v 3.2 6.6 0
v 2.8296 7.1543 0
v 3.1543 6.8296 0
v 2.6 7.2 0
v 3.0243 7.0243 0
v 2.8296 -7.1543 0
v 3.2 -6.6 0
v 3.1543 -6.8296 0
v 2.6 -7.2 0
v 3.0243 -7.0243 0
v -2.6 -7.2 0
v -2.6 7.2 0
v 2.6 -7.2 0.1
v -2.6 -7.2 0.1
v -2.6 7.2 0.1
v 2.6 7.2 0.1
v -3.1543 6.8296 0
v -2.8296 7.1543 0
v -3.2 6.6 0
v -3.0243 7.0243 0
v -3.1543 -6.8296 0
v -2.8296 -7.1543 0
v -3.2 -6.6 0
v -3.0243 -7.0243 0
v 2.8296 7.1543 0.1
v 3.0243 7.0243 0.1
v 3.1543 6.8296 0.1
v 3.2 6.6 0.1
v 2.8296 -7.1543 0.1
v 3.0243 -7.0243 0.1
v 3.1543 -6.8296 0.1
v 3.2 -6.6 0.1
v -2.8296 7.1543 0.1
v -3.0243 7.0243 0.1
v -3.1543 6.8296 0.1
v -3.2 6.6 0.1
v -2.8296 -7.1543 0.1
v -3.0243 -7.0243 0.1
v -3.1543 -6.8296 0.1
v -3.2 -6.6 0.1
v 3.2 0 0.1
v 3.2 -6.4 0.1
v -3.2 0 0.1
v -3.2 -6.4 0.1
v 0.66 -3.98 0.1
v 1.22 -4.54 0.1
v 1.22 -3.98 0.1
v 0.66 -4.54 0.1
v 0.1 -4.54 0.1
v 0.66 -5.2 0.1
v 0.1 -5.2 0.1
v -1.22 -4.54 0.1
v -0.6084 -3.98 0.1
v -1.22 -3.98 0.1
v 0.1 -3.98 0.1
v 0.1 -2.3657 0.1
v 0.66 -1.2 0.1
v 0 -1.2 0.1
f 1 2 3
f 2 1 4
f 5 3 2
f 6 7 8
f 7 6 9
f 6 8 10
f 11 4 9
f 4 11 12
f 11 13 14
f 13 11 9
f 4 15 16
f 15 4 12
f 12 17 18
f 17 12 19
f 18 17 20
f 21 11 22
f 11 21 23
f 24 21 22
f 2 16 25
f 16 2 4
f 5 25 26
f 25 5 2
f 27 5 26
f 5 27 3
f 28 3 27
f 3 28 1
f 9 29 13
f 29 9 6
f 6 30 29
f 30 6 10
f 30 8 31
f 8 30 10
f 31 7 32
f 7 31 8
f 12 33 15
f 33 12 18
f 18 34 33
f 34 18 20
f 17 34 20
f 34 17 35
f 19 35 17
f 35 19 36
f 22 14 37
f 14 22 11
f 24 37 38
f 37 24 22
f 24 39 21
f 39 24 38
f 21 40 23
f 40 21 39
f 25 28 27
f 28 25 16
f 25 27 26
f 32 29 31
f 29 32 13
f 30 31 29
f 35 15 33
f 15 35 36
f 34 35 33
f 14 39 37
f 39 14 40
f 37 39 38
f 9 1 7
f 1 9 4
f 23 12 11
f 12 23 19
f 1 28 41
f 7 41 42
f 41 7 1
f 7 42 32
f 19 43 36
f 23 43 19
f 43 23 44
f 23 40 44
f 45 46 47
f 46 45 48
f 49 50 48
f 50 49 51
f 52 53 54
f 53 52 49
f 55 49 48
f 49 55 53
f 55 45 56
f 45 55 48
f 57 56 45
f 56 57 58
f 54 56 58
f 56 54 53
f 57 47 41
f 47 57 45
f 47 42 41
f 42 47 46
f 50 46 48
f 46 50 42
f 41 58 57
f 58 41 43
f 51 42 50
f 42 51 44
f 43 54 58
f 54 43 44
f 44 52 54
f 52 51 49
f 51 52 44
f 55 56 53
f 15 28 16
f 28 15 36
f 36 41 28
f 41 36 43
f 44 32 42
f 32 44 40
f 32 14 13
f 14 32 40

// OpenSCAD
// file: ../p/box3u12.scad
use <../lib.scad>
function ldraw_lib__box3u12() = [
// 0 Box with 3 Parallel Faces without Any Edges
// 0 Name: box3u12.dat
// 0 Author: J.C. Tchang [tchang]
// 0 !LDRAW_ORG Primitive UPDATE 2014-02
// 0 !LICENSE Licensed under CC BY 4.0 : see CAreadme.txt
// 
// 0 BFC CERTIFY CCW
  [0,"BFC","CERTIFY"],
  [0,"BFC","CCW"],
// 
// 0 !HISTORY 2014-12-23 [PTadmin] Official Update 2014-02
// 
// 
// 4 16 -1 1 1 1 1 1 1 1 -1 -1 1 -1
  [4,16,-1,1,1,1,1,1,1,1,-1,-1,1,-1],
// 4 16 -1 1 1 -1 0 1 1 0 1 1 1 1
  [4,16,-1,1,1,-1,0,1,1,0,1,1,1,1],
// 4 16 1 1 -1 1 0 -1 -1 0 -1 -1 1 -1
  [4,16,1,1,-1,1,0,-1,-1,0,-1,-1,1,-1],
];
module ldraw_lib__box3u12(step=0, col=false, unit=2/5, alt=false, line=0.2, solid=!$preview)
    makepoly(ldraw_lib__box3u12(), step=step, col=col, unit=unit, alt=alt, line=line, solid=solid);
ldraw_lib__box3u12(line=0.2);
// file: ../p/1-4cyli.scad
use <../lib.scad>
function ldraw_lib__1_4cyli() = [
// 0 Cylinder 0.25
// 0 Name: 1-4cyli.dat
// 0 Author: James Jessiman
// 0 !LDRAW_ORG Primitive UPDATE 2012-01
// 0 !LICENSE Licensed under CC BY 4.0 : see CAreadme.txt
// 
// 0 BFC CERTIFY CCW
  [0,"BFC","CERTIFY"],
  [0,"BFC","CCW"],
// 
// 0 !HISTORY 2002-03-23 [sbliss] Added BFC statement.
// 0 !HISTORY 2002-04-25 [PTadmin] Official Update 2002-02
// 0 !HISTORY 2007-06-22 [PTadmin] Header formatted for Contributor Agreement
// 0 !HISTORY 2008-07-01 [PTadmin] Official Update 2008-01
// 0 !HISTORY 2012-02-16 [Philo] Changed to CCW
// 0 !HISTORY 2012-03-30 [PTadmin] Official Update 2012-01
// 
// 
// 4 16 1 1 0 0.9239 1 0.3827 0.9239 0 0.3827 1 0 0
  [4,16,1,1,0,0.9239,1,0.3827,0.9239,0,0.3827,1,0,0],
// 5 24 1 0 0 1 1 0 0.9239 0 0.3827 1 0 -1
  [5,24,1,0,0,1,1,0,0.9239,0,0.3827,1,0,-1],
// 4 16 0.9239 1 0.3827 0.7071 1 0.7071 0.7071 0 0.7071 0.9239 0 0.3827
  [4,16,0.9239,1,0.3827,0.7071,1,0.7071,0.7071,0,0.7071,0.9239,0,0.3827],
// 5 24 0.9239 0 0.3827 0.9239 1 0.3827 0.7071 0 0.7071 1 0 0
  [5,24,0.9239,0,0.3827,0.9239,1,0.3827,0.7071,0,0.7071,1,0,0],
// 4 16 0.7071 1 0.7071 0.3827 1 0.9239 0.3827 0 0.9239 0.7071 0 0.7071
  [4,16,0.7071,1,0.7071,0.3827,1,0.9239,0.3827,0,0.9239,0.7071,0,0.7071],
// 5 24 0.7071 0 0.7071 0.7071 1 0.7071 0.3827 0 0.9239 0.9239 0 0.3827
  [5,24,0.7071,0,0.7071,0.7071,1,0.7071,0.3827,0,0.9239,0.9239,0,0.3827],
// 4 16 0.3827 1 0.9239 0 1 1 0 0 1 0.3827 0 0.9239
  [4,16,0.3827,1,0.9239,0,1,1,0,0,1,0.3827,0,0.9239],
// 5 24 0.3827 0 0.9239 0.3827 1 0.9239 0 0 1 0.7071 0 0.7071
  [5,24,0.3827,0,0.9239,0.3827,1,0.9239,0,0,1,0.7071,0,0.7071],
// 5 24 0 0 1 0 1 1 0.3827 0 0.9239 -1 0 1
  [5,24,0,0,1,0,1,1,0.3827,0,0.9239,-1,0,1],
];
module ldraw_lib__1_4cyli(step=0, col=false, unit=2/5, alt=false, line=0.2, solid=!$preview)
    makepoly(ldraw_lib__1_4cyli(), step=step, col=col, unit=unit, alt=alt, line=line, solid=solid);
ldraw_lib__1_4cyli(line=0.2);
// file: ../p/1-4chrd.scad
use <../lib.scad>
function ldraw_lib__1_4chrd() = [
// 0 Chord 0.25
// 0 Name: 1-4chrd.dat
// 0 Author: Max Martin Richter [MMR1988]
// 0 !LDRAW_ORG Primitive UPDATE 2023-05
// 0 !LICENSE Licensed under CC BY 4.0 : see CAreadme.txt
// 
// 0 BFC CERTIFY CCW
  [0,"BFC","CERTIFY"],
  [0,"BFC","CCW"],
// 
// 0 !HISTORY 2004-04-22 [PTadmin] Official Update 2004-02
// 0 !HISTORY 2007-10-09 [PTadmin] Header formatted for Contributor Agreement
// 0 !HISTORY 2008-07-01 [PTadmin] Official Update 2008-01
// 0 !HISTORY 2012-08-02 [MMR1988] Re-creation with PrimGen2 and Rectifier
// 0 !HISTORY 2012-08-09 [PTadmin] Official Update 2012-02
// 0 !HISTORY 2023-10-27 [OrionP] Change author to MMR1988 from hafhead
// 0 !HISTORY 2023-10-31 [OrionP] Official Update 2023-05
// 
// 4 16 0.9239 0 0.3827 0.3827 0 0.9239 0 0 1 1 0 0
  [4,16,0.9239,0,0.3827,0.3827,0,0.9239,0,0,1,1,0,0],
// 3 16 0.7071 0 0.7071 0.3827 0 0.9239 0.9239 0 0.3827
  [3,16,0.7071,0,0.7071,0.3827,0,0.9239,0.9239,0,0.3827],
];
module ldraw_lib__1_4chrd(step=0, col=false, unit=2/5, alt=false, line=0.2, solid=!$preview)
    makepoly(ldraw_lib__1_4chrd(), step=step, col=col, unit=unit, alt=alt, line=line, solid=solid);
ldraw_lib__1_4chrd(line=0.2);
// main file
use <../lib.scad>
use <../p/1-4chrd.scad>
use <../p/1-4cyli.scad>
use <../p/box3u12.scad>
function ldraw_lib__6142271o() = [
// 0 Sticker  1.8 x  0.8 with Black 4 on White Stripe on Blue Background
// 0 Name: 6142271o.dat
// 0 Author: Massimo Maso [Sirio]
// 0 !LDRAW_ORG Part UPDATE 2026-07
// 0 !LICENSE Licensed under CC BY 4.0 : see CAreadme.txt
// 
// 0 BFC CERTIFY CCW
  [0,"BFC","CERTIFY"],
  [0,"BFC","CCW"],
// 
// 0 !CATEGORY Sticker
// 0 !KEYWORDS Audi, Bricklink 75873stk01a, Brickowl 427960, LMS, R8
// 0 !KEYWORDS Rebrickable 24755, Set 75873, Speed Champions, Ultra
// 
// 0 !HISTORY 2025-02-27 [OrionP] Official Update 2025-02
// 0 !HISTORY 2026-07-18 [MagFors] Update description
// 0 !HISTORY 2026-07-30 [OrionP] Official Update 2026-07
// 
// 0 // Primitives
// 1 16 6.5 0 16.5 0 0 1.5 0 -1 0 1.5 0 0 1-4chrd.dat
  [1,16,6.5,0,16.5,0,0,1.5,0,-1,0,1.5,0,0, ldraw_lib__1_4chrd()],
// 1 16 6.5 0 -16.5 0 0 1.5 0 -1 0 -1.5 0 0 1-4chrd.dat
  [1,16,6.5,0,-16.5,0,0,1.5,0,-1,0,-1.5,0,0, ldraw_lib__1_4chrd()],
// 1 16 0 -.25 0 6.5 0 0 0 .25 0 0 0 -18 box3u12.dat
  [1,16,0,-.25,0,6.5,0,0,0,.25,0,0,0,-18, ldraw_lib__box3u12()],
// 1 16 -6.5 0 16.5 0 0 -1.5 0 -1 0 1.5 0 0 1-4chrd.dat
  [1,16,-6.5,0,16.5,0,0,-1.5,0,-1,0,1.5,0,0, ldraw_lib__1_4chrd()],
// 1 16 -6.5 0 -16.5 0 0 -1.5 0 -1 0 -1.5 0 0 1-4chrd.dat
  [1,16,-6.5,0,-16.5,0,0,-1.5,0,-1,0,-1.5,0,0, ldraw_lib__1_4chrd()],
// 1 16 6.5 0 16.5 0 0 1.5 0 -.25 0 1.5 0 0 1-4cyli.dat
  [1,16,6.5,0,16.5,0,0,1.5,0,-.25,0,1.5,0,0, ldraw_lib__1_4cyli()],
// 1 16 6.5 0 -16.5 0 0 1.5 0 -.25 0 -1.5 0 0 1-4cyli.dat
  [1,16,6.5,0,-16.5,0,0,1.5,0,-.25,0,-1.5,0,0, ldraw_lib__1_4cyli()],
// 1 16 -6.5 0 16.5 0 0 -1.5 0 -.25 0 1.5 0 0 1-4cyli.dat
  [1,16,-6.5,0,16.5,0,0,-1.5,0,-.25,0,1.5,0,0, ldraw_lib__1_4cyli()],
// 1 16 -6.5 0 -16.5 0 0 -1.5 0 -.25 0 -1.5 0 0 1-4cyli.dat
  [1,16,-6.5,0,-16.5,0,0,-1.5,0,-.25,0,-1.5,0,0, ldraw_lib__1_4cyli()],
// 1 1 6.5 -.25 16.5 0 0 1.5 0 1 0 1.5 0 0 1-4chrd.dat
  [1,1,6.5,-.25,16.5,0,0,1.5,0,1,0,1.5,0,0, ldraw_lib__1_4chrd()],
// 1 1 6.5 -.25 -16.5 0 0 1.5 0 1 0 -1.5 0 0 1-4chrd.dat
  [1,1,6.5,-.25,-16.5,0,0,1.5,0,1,0,-1.5,0,0, ldraw_lib__1_4chrd()],
// 1 1 -6.5 -.25 16.5 0 0 -1.5 0 1 0 1.5 0 0 1-4chrd.dat
  [1,1,-6.5,-.25,16.5,0,0,-1.5,0,1,0,1.5,0,0, ldraw_lib__1_4chrd()],
// 1 1 -6.5 -.25 -16.5 0 0 -1.5 0 1 0 -1.5 0 0 1-4chrd.dat
  [1,1,-6.5,-.25,-16.5,0,0,-1.5,0,1,0,-1.5,0,0, ldraw_lib__1_4chrd()],
// 0 // Bottom faces
// 4 16 8 0 -16.5 6.5 0 -18 6.5 0 18 8 0 16.5
  [4,16,8,0,-16.5,6.5,0,-18,6.5,0,18,8,0,16.5],
// 4 16 -8 0 -16.5 -8 0 16.5 -6.5 0 18 -6.5 0 -18
  [4,16,-8,0,-16.5,-8,0,16.5,-6.5,0,18,-6.5,0,-18],
// 0 // Lateral faces
// 3 16 8 0 16.5 8 -.25 16.5 8 -.25 0
  [3,16,8,0,16.5,8,-.25,16.5,8,-.25,0],
// 4 16 8 0 16.5 8 -.25 0 8 -.25 -16 8 0 -16.5
  [4,16,8,0,16.5,8,-.25,0,8,-.25,-16,8,0,-16.5],
// 3 16 8 0 -16.5 8 -.25 -16 8 -.25 -16.5
  [3,16,8,0,-16.5,8,-.25,-16,8,-.25,-16.5],
// 3 16 -8 0 16.5 -8 -.25 0 -8 -.25 16.5
  [3,16,-8,0,16.5,-8,-.25,0,-8,-.25,16.5],
// 4 16 -8 0 16.5 -8 0 -16.5 -8 -.25 -16 -8 -.25 0
  [4,16,-8,0,16.5,-8,0,-16.5,-8,-.25,-16,-8,-.25,0],
// 3 16 -8 0 -16.5 -8 -.25 -16.5 -8 -.25 -16
  [3,16,-8,0,-16.5,-8,-.25,-16.5,-8,-.25,-16],
// 0 // Black number 4
// 4 0 3.05 -.25 -9.95 1.65 -.25 -9.95 1.65 -.25 -11.35 3.05 -.25 -11.35
  [4,0,3.05,-.25,-9.95,1.65,-.25,-9.95,1.65,-.25,-11.35,3.05,-.25,-11.35],
// 4 0 1.65 -.25 -11.35 .25 -.25 -11.35 .25 -.25 -13 1.65 -.25 -13
  [4,0,1.65,-.25,-11.35,.25,-.25,-11.35,.25,-.25,-13,1.65,-.25,-13],
// 4 0 .25 -.25 -11.35 -1.5211 -.25 -9.95 -3.05 -.25 -9.95 -3.05 -.25 -11.35
  [4,0,.25,-.25,-11.35,-1.5211,-.25,-9.95,-3.05,-.25,-9.95,-3.05,-.25,-11.35],
// 4 0 1.65 -.25 -11.35 .25 -.25 -9.95 -1.5211 -.25 -9.95 .25 -.25 -11.35
  [4,0,1.65,-.25,-11.35,.25,-.25,-9.95,-1.5211,-.25,-9.95,.25,-.25,-11.35],
// 4 0 1.65 -.25 -9.95 .25 -.25 -5.9142 .25 -.25 -9.95 1.65 -.25 -11.35
  [4,0,1.65,-.25,-9.95,.25,-.25,-5.9142,.25,-.25,-9.95,1.65,-.25,-11.35],
// 4 0 1.65 -.25 -9.95 1.65 -.25 -3 0 -.25 -3 .25 -.25 -5.9142
  [4,0,1.65,-.25,-9.95,1.65,-.25,-3,0,-.25,-3,.25,-.25,-5.9142],
// 4 0 .25 -.25 -5.9142 0 -.25 -3 -3.05 -.25 -9.95 -1.5211 -.25 -9.95
  [4,0,.25,-.25,-5.9142,0,-.25,-3,-3.05,-.25,-9.95,-1.5211,-.25,-9.95],
// 0 // White top faces
// 4 15 8 -.25 0 1.65 -.25 -3 1.65 -.25 -9.95 3.05 -.25 -9.95
  [4,15,8,-.25,0,1.65,-.25,-3,1.65,-.25,-9.95,3.05,-.25,-9.95],
// 4 15 8 -.25 0 3.05 -.25 -9.95 3.05 -.25 -11.35 8 -.25 -16
  [4,15,8,-.25,0,3.05,-.25,-9.95,3.05,-.25,-11.35,8,-.25,-16],
// 4 15 8 -.25 -16 3.05 -.25 -11.35 1.65 -.25 -11.35 1.65 -.25 -13
  [4,15,8,-.25,-16,3.05,-.25,-11.35,1.65,-.25,-11.35,1.65,-.25,-13],
// 4 15 8 -.25 0 -8 -.25 0 0 -.25 -3 1.65 -.25 -3
  [4,15,8,-.25,0,-8,-.25,0,0,-.25,-3,1.65,-.25,-3],
// 4 15 8 -.25 -16 1.65 -.25 -13 .25 -.25 -13 -8 -.25 -16
  [4,15,8,-.25,-16,1.65,-.25,-13,.25,-.25,-13,-8,-.25,-16],
// 4 15 -8 -.25 0 -8 -.25 -16 -3.05 -.25 -9.95 0 -.25 -3
  [4,15,-8,-.25,0,-8,-.25,-16,-3.05,-.25,-9.95,0,-.25,-3],
// 3 15 -8 -.25 -16 -3.05 -.25 -11.35 -3.05 -.25 -9.95
  [3,15,-8,-.25,-16,-3.05,-.25,-11.35,-3.05,-.25,-9.95],
// 4 15 -8 -.25 -16 .25 -.25 -13 .25 -.25 -11.35 -3.05 -.25 -11.35
  [4,15,-8,-.25,-16,.25,-.25,-13,.25,-.25,-11.35,-3.05,-.25,-11.35],
// 3 15 .25 -.25 -9.95 .25 -.25 -5.9142 -1.5211 -.25 -9.95
  [3,15,.25,-.25,-9.95,.25,-.25,-5.9142,-1.5211,-.25,-9.95],
// 0 // Blue top faces
// 4 1 8 -.25 16.5 6.5 -.25 18 -6.5 -.25 18 -8 -.25 16.5
  [4,1,8,-.25,16.5,6.5,-.25,18,-6.5,-.25,18,-8,-.25,16.5],
// 4 1 8 -.25 16.5 -8 -.25 16.5 -8 -.25 0 8 -.25 0
  [4,1,8,-.25,16.5,-8,-.25,16.5,-8,-.25,0,8,-.25,0],
// 4 1 8 -.25 -16 -8 -.25 -16 -8 -.25 -16.5 8 -.25 -16.5
  [4,1,8,-.25,-16,-8,-.25,-16,-8,-.25,-16.5,8,-.25,-16.5],
// 4 1 8 -.25 -16.5 -8 -.25 -16.5 -6.5 -.25 -18 6.5 -.25 -18
  [4,1,8,-.25,-16.5,-8,-.25,-16.5,-6.5,-.25,-18,6.5,-.25,-18],
];
module ldraw_lib__6142271o(step=0, col=false, unit=2/5, alt=false, line=0.2, solid=!$preview)
    makepoly(ldraw_lib__6142271o(), step=step, col=col, unit=unit, alt=alt, line=line, solid=solid);
ldraw_lib__6142271o(line=0.2);
